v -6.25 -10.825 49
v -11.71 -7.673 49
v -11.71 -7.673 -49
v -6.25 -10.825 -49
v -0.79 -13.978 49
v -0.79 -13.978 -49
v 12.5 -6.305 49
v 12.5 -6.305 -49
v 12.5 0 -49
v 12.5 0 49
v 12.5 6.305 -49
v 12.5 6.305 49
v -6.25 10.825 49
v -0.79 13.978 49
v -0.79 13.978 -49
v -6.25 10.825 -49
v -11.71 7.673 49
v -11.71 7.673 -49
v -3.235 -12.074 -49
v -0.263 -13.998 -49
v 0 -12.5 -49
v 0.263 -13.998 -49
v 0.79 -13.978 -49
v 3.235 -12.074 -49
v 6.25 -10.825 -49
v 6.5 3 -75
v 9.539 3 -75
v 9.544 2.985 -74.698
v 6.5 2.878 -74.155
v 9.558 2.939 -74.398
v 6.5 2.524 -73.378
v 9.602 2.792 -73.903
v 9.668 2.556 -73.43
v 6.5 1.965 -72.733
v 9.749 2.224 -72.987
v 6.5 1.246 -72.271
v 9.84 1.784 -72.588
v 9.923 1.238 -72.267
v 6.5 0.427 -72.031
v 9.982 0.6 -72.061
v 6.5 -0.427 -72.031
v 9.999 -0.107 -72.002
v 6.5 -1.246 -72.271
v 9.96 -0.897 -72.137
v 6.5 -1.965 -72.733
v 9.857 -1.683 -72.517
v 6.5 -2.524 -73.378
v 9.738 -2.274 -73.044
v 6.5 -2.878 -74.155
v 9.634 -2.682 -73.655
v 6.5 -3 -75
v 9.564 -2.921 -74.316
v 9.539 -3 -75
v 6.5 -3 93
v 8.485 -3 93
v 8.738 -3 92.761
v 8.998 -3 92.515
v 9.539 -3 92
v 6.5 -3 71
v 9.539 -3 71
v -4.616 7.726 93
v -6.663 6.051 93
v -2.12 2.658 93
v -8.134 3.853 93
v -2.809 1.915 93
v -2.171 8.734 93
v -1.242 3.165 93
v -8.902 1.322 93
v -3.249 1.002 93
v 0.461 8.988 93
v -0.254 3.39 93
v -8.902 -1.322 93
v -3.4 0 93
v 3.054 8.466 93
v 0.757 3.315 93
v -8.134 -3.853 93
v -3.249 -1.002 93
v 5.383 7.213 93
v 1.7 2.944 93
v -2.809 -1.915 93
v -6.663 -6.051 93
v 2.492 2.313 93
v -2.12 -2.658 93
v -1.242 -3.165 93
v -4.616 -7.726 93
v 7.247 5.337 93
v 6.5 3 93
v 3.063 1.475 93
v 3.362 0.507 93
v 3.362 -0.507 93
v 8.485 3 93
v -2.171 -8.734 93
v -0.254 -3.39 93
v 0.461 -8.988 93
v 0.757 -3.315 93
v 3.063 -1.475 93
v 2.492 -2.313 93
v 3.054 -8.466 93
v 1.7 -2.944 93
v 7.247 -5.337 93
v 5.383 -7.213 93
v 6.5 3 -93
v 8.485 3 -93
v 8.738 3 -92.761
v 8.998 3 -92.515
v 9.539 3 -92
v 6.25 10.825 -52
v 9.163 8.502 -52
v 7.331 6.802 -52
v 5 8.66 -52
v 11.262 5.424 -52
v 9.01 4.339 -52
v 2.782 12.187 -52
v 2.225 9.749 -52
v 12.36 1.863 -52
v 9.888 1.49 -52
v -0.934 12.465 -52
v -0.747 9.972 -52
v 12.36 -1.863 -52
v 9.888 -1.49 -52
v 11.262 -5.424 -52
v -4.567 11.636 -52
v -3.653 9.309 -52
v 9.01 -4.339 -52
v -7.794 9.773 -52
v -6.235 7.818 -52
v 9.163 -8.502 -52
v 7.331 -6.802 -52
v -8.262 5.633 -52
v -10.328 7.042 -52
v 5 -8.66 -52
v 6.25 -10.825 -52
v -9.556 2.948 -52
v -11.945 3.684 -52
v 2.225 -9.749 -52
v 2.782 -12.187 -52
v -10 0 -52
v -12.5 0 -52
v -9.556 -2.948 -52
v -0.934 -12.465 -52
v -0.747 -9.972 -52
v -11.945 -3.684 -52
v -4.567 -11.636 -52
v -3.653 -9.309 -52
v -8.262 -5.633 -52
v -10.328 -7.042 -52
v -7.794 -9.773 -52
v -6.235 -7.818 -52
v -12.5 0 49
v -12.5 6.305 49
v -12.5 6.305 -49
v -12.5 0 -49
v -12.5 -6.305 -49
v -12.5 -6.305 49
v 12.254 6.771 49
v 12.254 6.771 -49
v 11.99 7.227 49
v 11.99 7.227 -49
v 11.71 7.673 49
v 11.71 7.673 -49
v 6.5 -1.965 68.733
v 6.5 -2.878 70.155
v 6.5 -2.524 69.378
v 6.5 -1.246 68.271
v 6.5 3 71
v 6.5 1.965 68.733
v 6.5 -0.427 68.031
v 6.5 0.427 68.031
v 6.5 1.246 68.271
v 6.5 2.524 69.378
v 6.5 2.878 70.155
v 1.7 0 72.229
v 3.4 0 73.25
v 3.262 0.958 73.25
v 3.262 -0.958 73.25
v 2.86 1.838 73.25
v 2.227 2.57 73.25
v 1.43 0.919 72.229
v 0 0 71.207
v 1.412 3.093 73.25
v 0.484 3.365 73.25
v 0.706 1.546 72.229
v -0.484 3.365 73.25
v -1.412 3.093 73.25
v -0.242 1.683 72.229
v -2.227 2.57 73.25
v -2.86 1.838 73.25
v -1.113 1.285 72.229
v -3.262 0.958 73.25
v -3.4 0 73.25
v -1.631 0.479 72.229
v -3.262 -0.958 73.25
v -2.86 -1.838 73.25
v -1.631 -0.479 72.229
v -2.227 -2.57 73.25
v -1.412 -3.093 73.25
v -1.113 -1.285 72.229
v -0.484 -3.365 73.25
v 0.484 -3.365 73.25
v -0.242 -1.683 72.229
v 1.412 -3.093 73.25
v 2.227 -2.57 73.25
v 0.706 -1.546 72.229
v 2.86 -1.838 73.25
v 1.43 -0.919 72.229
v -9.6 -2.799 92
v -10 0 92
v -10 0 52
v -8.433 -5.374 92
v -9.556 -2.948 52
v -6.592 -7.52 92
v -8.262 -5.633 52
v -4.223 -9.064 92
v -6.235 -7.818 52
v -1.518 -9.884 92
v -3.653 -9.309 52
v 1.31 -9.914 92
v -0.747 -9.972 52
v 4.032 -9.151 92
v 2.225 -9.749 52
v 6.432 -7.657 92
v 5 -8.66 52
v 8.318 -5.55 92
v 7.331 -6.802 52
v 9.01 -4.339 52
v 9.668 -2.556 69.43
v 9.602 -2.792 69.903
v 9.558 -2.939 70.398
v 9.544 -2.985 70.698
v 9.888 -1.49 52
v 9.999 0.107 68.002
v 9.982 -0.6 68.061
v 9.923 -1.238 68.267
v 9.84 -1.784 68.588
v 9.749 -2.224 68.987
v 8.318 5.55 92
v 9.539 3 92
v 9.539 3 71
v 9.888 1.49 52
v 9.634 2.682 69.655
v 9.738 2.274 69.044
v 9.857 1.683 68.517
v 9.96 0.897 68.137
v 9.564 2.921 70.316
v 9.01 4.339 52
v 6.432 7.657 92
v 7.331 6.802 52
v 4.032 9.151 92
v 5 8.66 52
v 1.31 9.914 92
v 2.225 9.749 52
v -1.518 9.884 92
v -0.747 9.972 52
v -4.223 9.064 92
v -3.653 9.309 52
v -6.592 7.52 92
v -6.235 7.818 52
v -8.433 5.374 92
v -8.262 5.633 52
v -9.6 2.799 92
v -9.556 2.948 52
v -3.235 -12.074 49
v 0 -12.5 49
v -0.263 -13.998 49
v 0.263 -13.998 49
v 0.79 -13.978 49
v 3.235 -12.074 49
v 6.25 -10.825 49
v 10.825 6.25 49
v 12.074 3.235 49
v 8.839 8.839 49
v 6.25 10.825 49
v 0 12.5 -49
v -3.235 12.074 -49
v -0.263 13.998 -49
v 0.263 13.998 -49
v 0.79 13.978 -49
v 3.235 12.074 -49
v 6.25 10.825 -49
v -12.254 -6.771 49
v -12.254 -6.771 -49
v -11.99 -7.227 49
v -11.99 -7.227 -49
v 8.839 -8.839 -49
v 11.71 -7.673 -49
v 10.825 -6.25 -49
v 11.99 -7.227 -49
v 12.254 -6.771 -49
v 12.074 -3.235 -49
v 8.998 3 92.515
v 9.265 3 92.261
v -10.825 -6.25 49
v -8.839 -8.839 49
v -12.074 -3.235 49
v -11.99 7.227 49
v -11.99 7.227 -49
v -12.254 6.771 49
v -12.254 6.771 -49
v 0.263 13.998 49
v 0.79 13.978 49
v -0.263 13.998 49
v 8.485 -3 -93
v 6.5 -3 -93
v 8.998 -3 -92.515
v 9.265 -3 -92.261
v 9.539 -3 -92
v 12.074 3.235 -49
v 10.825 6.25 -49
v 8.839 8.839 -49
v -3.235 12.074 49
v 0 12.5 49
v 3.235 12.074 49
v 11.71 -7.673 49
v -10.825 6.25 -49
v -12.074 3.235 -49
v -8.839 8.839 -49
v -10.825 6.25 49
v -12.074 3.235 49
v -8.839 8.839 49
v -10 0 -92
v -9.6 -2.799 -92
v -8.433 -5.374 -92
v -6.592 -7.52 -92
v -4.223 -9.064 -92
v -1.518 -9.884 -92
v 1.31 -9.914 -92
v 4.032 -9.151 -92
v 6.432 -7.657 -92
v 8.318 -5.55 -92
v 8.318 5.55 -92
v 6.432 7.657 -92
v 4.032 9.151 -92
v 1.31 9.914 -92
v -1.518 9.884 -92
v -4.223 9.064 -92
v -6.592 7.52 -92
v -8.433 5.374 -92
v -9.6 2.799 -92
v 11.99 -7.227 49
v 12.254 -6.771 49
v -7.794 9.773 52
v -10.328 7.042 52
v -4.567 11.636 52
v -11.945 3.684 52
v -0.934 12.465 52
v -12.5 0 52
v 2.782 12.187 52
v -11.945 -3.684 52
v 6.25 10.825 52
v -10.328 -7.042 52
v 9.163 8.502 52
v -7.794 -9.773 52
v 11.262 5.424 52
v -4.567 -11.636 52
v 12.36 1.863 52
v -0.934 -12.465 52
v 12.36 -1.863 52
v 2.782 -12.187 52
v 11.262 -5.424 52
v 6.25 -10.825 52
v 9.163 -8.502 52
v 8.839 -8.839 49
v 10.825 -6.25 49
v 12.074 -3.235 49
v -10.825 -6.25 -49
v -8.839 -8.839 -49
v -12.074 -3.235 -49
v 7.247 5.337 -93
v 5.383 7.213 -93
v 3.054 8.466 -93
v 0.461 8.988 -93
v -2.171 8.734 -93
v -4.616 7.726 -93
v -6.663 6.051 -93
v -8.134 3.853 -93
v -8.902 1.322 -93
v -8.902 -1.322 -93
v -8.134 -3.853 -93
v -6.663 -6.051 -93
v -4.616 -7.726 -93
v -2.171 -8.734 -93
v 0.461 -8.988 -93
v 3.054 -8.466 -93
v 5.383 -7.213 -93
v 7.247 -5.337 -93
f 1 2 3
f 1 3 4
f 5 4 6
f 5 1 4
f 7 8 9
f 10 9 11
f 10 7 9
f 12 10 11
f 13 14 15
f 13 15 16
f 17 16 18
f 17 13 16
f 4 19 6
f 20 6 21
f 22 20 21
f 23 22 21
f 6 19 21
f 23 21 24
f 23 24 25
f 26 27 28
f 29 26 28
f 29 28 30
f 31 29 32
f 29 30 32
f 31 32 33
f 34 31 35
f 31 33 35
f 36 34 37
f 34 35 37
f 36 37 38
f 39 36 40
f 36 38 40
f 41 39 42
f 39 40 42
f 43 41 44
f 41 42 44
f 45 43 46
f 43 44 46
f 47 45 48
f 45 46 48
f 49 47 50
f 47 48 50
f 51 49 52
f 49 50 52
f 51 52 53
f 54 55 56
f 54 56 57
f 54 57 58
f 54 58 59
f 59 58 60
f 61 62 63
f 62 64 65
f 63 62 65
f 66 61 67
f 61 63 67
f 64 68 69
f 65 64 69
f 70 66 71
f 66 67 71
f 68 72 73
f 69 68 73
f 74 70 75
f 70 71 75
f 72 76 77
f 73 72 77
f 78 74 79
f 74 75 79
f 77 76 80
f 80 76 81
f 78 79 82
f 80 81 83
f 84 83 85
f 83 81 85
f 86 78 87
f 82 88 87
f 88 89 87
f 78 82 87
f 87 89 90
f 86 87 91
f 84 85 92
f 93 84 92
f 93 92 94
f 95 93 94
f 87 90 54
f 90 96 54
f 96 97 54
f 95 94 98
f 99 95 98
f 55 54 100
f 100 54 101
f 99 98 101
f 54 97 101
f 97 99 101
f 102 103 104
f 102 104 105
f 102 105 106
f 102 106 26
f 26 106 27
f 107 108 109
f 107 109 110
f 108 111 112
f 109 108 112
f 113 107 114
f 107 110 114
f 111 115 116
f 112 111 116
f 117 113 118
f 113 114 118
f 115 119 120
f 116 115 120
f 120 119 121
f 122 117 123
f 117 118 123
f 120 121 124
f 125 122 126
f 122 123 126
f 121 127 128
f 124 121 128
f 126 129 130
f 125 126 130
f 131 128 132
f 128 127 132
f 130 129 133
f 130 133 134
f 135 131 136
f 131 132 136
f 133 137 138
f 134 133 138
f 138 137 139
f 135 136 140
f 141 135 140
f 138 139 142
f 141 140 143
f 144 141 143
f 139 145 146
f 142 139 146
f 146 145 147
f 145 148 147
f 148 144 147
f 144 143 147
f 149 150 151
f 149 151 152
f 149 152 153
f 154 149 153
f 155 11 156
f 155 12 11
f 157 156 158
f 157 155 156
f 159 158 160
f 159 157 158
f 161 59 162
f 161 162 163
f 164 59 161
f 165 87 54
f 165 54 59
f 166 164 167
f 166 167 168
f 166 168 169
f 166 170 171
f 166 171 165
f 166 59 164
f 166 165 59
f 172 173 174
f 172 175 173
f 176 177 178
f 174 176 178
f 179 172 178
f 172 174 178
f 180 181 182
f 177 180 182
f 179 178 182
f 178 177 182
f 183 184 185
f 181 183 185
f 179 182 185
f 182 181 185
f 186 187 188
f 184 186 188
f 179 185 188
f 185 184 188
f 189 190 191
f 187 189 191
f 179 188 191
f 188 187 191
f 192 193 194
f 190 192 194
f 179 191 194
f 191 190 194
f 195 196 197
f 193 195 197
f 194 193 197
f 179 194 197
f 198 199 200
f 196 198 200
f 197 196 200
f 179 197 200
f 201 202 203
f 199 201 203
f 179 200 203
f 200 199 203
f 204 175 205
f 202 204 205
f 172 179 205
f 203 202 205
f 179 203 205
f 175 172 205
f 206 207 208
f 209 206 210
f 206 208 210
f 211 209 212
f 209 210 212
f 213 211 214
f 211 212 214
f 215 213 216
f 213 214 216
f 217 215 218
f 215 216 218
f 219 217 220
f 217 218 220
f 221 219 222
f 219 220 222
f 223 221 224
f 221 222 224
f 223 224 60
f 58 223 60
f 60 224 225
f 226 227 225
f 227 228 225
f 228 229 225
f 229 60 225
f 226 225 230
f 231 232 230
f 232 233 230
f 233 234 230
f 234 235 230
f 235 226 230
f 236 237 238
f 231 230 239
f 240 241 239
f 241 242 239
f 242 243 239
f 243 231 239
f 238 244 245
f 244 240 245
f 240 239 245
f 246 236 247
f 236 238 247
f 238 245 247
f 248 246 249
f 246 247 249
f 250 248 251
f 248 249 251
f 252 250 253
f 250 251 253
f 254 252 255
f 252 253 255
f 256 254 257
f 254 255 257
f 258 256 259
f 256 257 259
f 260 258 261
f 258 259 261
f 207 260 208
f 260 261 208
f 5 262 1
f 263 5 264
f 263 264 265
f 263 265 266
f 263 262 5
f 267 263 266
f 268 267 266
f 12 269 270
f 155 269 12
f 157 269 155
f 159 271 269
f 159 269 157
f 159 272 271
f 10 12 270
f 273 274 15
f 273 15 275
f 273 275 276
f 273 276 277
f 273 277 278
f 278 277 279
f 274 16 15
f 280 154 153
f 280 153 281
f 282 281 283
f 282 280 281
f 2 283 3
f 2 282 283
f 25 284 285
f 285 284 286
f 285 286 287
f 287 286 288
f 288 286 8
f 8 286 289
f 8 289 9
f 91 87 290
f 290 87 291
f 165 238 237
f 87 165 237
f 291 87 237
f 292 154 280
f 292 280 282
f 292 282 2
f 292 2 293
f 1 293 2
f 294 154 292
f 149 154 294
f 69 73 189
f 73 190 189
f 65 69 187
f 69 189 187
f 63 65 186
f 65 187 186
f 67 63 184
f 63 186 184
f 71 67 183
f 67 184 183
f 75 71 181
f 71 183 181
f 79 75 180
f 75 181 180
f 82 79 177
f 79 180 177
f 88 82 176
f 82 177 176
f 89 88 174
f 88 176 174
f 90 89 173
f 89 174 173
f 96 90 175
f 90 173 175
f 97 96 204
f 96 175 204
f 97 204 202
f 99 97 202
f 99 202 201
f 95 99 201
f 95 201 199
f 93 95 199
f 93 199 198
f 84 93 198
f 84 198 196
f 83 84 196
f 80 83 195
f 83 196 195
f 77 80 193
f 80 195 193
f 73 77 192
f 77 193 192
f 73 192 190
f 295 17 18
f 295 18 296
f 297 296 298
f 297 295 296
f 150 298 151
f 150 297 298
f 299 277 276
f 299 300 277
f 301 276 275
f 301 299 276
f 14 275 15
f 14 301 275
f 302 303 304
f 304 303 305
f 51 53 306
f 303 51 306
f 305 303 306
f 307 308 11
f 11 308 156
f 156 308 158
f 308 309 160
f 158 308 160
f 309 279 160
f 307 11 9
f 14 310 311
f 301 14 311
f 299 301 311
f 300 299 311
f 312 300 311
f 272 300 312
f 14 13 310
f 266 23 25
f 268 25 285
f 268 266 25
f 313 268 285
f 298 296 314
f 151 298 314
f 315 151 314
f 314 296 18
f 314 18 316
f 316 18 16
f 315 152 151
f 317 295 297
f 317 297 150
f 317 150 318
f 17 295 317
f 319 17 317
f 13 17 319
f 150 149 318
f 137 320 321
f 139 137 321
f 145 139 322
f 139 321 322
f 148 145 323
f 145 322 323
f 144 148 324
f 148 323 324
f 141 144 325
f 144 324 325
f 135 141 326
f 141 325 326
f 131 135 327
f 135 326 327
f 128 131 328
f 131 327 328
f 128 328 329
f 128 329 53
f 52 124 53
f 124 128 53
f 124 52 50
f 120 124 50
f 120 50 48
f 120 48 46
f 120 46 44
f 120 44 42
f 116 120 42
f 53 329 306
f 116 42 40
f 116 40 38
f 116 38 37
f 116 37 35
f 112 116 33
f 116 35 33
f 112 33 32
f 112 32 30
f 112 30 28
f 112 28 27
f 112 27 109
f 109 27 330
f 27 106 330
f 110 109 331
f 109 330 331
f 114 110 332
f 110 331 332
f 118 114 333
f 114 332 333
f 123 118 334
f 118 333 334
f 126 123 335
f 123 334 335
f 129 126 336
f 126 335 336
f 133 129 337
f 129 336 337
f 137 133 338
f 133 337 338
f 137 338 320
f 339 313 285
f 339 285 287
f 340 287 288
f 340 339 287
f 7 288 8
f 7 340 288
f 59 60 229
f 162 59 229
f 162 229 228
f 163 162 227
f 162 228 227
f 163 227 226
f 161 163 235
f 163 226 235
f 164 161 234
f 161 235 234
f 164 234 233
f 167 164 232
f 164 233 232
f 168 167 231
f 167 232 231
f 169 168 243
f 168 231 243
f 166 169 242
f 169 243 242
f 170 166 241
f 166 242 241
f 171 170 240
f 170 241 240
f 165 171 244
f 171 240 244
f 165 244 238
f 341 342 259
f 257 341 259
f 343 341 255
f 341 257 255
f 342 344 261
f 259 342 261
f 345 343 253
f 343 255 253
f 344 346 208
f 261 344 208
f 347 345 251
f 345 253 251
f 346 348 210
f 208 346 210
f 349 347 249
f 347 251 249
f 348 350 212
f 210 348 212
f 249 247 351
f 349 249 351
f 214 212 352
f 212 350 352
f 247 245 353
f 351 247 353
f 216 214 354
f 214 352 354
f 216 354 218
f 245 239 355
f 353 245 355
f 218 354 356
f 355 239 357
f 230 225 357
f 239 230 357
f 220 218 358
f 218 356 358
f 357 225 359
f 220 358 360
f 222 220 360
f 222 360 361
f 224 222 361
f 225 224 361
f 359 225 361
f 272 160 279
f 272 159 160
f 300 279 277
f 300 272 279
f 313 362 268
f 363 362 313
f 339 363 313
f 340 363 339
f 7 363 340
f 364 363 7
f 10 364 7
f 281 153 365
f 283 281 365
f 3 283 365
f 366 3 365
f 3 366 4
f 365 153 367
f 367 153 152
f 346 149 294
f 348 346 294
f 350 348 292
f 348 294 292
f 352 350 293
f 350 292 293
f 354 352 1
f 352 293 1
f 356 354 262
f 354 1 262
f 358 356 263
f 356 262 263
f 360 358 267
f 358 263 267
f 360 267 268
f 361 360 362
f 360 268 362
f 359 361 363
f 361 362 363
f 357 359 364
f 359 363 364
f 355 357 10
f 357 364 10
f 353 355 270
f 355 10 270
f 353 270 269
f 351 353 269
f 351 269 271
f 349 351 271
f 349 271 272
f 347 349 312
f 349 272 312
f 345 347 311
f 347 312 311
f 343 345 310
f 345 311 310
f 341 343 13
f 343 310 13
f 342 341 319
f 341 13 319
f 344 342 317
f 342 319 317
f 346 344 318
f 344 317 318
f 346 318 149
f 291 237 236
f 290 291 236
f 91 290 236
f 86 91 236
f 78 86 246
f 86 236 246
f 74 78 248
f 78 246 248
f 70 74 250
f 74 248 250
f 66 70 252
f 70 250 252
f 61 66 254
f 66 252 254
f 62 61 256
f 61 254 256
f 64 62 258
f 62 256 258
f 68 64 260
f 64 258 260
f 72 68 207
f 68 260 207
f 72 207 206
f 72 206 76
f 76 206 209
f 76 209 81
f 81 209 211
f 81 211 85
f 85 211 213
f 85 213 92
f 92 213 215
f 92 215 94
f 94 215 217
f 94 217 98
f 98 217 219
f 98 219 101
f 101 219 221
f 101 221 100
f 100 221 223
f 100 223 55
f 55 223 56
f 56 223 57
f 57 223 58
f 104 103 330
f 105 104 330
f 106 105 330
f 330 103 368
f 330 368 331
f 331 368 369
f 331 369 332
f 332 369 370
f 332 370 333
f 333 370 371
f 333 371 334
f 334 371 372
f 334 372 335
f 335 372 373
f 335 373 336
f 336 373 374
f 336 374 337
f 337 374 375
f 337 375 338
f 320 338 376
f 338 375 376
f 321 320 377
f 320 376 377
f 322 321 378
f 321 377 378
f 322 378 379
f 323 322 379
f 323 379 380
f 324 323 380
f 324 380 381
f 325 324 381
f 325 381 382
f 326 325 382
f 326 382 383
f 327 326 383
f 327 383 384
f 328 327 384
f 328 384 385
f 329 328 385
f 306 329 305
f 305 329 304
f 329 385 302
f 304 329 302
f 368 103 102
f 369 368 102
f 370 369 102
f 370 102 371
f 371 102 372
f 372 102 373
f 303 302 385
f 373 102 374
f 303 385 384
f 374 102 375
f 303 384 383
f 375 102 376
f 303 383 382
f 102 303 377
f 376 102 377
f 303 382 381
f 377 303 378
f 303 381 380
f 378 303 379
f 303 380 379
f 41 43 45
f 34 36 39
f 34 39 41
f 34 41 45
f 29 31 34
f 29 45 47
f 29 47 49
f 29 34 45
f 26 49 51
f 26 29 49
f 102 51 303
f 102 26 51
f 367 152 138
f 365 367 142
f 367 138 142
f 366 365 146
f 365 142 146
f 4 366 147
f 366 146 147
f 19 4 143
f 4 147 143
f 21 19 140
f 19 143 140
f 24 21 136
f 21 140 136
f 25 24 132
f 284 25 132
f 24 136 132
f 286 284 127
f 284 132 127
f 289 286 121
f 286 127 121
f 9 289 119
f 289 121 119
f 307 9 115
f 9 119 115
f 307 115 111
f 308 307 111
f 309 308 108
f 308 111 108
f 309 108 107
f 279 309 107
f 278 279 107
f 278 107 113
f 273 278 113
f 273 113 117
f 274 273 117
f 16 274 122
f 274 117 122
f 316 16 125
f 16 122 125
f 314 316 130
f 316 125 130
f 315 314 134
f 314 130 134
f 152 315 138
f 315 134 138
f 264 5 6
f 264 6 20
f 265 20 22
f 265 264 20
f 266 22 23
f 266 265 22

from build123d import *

# Parameters (mm, degrees)
BOSS_EXTRUDE1_DEPTH   = 49
CHAMFER1_SIZE         = 1
M8_TAPPED_HOLE1_D     = 6.8
M8_TAPPED_HOLE1_DEPTH = 19.75
M8_TAPPED_HOLE1_TIP   = 2.042926105
CUT_EXTRUDE1_START    = 10
CUT_EXTRUDE1_DEPTH    = 3.5


with BuildPart() as part:
    # Sketch1 → Boss-Extrude1 (new, symmetric)
    with BuildSketch(Plane.XY):
        with BuildLine():
            ThreePointArc((0.789917583, 13.977697601), (0, 14), (-0.789917583, 13.977697601))
            Line((-0.789917583, 13.977697601), (-11.710082417, 7.672937494))
            ThreePointArc((-11.710082417, 7.672937494), (-12.124355653, 7), (-12.5, 6.304760106))
            Line((-12.5, 6.304760106), (-12.5, -6.304760106))
            ThreePointArc((-12.5, -6.304760106), (-12.124355653, -7), (-11.710082417, -7.672937494))
            Line((-11.710082417, -7.672937494), (-0.789917583, -13.977697601))
            ThreePointArc((-0.789917583, -13.977697601), (0, -14), (0.789917583, -13.977697601))
            Line((0.789917583, -13.977697601), (11.710082417, -7.672937494))
            ThreePointArc((11.710082417, -7.672937494), (12.124355653, -7), (12.5, -6.304760106))
            Line((12.5, -6.304760106), (12.5, 6.304760106))
            ThreePointArc((12.5, 6.304760106), (12.124355653, 7), (11.710082417, 7.672937494))
            Line((11.710082417, 7.672937494), (0.789917583, 13.977697601))
        make_face()
    extrude(amount=BOSS_EXTRUDE1_DEPTH, both=True)

    # Sketch2 → Revolve1 (revolve)
    with BuildSketch(Plane(origin=(0, 0, 0), x_dir=(0, 0, -1), z_dir=(1, 0, 0)), mode=Mode.PRIVATE) as revolve1_sk:
        Polygon((-93, 0), (-93, 10), (-52, 10), (-52, 12.5), (-49, 12.5), (-49, 0), align=None)
        Polygon((52, 10), (93, 10), (93, 0), (49, 0), (49, 12.5), (52, 12.5), align=None)
    revolve(revolve1_sk.sketch.rotate(Axis((0, 0, -70.752525622), (0, 0, 1)), 90), axis=Axis((0, 0, -70.752525622), (0, 0, 1)))

    # Chamfer1
    chamfer1_edges = [part.edges().sort_by_distance(p)[0] for p in [
        (10, 0, 93),
        (10, 0, -93),
    ]]
    chamfer(chamfer1_edges, length=CHAMFER1_SIZE)

    # M8 Tapped Hole1
    with Locations(Plane.XY.offset(93)):
        with Locations((0, 0)):
            Hole(M8_TAPPED_HOLE1_D / 2, depth=M8_TAPPED_HOLE1_DEPTH)
            with Locations((0, 0, -(M8_TAPPED_HOLE1_DEPTH + M8_TAPPED_HOLE1_TIP / 2))):  # 118° drill point
                Cone(0, M8_TAPPED_HOLE1_D / 2, M8_TAPPED_HOLE1_TIP, mode=Mode.SUBTRACT)

    # Sketch4 → Cut-Extrude1 (cut)
    with BuildSketch(Plane(origin=(0, 0, 0), x_dir=(0, 0, -1), z_dir=(1, 0, 0)).offset(CUT_EXTRUDE1_START)):
        with BuildLine():
            Line((-93, -3), (-71, -3))
            ThreePointArc((-71, -3), (-68, 0), (-71, 3))
            Line((-71, 3), (-93, 3))
            ThreePointArc((-93, 3), (-96, 0), (-93, -3))
        make_face()
        with BuildLine():
            Line((93, 3), (75, 3))
            ThreePointArc((75, 3), (72, 0), (75, -3))
            Line((75, -3), (93, -3))
            ThreePointArc((93, -3), (96, 0), (93, 3))
        make_face()
    extrude(amount=-CUT_EXTRUDE1_DEPTH, mode=Mode.SUBTRACT)


solid = part.part
